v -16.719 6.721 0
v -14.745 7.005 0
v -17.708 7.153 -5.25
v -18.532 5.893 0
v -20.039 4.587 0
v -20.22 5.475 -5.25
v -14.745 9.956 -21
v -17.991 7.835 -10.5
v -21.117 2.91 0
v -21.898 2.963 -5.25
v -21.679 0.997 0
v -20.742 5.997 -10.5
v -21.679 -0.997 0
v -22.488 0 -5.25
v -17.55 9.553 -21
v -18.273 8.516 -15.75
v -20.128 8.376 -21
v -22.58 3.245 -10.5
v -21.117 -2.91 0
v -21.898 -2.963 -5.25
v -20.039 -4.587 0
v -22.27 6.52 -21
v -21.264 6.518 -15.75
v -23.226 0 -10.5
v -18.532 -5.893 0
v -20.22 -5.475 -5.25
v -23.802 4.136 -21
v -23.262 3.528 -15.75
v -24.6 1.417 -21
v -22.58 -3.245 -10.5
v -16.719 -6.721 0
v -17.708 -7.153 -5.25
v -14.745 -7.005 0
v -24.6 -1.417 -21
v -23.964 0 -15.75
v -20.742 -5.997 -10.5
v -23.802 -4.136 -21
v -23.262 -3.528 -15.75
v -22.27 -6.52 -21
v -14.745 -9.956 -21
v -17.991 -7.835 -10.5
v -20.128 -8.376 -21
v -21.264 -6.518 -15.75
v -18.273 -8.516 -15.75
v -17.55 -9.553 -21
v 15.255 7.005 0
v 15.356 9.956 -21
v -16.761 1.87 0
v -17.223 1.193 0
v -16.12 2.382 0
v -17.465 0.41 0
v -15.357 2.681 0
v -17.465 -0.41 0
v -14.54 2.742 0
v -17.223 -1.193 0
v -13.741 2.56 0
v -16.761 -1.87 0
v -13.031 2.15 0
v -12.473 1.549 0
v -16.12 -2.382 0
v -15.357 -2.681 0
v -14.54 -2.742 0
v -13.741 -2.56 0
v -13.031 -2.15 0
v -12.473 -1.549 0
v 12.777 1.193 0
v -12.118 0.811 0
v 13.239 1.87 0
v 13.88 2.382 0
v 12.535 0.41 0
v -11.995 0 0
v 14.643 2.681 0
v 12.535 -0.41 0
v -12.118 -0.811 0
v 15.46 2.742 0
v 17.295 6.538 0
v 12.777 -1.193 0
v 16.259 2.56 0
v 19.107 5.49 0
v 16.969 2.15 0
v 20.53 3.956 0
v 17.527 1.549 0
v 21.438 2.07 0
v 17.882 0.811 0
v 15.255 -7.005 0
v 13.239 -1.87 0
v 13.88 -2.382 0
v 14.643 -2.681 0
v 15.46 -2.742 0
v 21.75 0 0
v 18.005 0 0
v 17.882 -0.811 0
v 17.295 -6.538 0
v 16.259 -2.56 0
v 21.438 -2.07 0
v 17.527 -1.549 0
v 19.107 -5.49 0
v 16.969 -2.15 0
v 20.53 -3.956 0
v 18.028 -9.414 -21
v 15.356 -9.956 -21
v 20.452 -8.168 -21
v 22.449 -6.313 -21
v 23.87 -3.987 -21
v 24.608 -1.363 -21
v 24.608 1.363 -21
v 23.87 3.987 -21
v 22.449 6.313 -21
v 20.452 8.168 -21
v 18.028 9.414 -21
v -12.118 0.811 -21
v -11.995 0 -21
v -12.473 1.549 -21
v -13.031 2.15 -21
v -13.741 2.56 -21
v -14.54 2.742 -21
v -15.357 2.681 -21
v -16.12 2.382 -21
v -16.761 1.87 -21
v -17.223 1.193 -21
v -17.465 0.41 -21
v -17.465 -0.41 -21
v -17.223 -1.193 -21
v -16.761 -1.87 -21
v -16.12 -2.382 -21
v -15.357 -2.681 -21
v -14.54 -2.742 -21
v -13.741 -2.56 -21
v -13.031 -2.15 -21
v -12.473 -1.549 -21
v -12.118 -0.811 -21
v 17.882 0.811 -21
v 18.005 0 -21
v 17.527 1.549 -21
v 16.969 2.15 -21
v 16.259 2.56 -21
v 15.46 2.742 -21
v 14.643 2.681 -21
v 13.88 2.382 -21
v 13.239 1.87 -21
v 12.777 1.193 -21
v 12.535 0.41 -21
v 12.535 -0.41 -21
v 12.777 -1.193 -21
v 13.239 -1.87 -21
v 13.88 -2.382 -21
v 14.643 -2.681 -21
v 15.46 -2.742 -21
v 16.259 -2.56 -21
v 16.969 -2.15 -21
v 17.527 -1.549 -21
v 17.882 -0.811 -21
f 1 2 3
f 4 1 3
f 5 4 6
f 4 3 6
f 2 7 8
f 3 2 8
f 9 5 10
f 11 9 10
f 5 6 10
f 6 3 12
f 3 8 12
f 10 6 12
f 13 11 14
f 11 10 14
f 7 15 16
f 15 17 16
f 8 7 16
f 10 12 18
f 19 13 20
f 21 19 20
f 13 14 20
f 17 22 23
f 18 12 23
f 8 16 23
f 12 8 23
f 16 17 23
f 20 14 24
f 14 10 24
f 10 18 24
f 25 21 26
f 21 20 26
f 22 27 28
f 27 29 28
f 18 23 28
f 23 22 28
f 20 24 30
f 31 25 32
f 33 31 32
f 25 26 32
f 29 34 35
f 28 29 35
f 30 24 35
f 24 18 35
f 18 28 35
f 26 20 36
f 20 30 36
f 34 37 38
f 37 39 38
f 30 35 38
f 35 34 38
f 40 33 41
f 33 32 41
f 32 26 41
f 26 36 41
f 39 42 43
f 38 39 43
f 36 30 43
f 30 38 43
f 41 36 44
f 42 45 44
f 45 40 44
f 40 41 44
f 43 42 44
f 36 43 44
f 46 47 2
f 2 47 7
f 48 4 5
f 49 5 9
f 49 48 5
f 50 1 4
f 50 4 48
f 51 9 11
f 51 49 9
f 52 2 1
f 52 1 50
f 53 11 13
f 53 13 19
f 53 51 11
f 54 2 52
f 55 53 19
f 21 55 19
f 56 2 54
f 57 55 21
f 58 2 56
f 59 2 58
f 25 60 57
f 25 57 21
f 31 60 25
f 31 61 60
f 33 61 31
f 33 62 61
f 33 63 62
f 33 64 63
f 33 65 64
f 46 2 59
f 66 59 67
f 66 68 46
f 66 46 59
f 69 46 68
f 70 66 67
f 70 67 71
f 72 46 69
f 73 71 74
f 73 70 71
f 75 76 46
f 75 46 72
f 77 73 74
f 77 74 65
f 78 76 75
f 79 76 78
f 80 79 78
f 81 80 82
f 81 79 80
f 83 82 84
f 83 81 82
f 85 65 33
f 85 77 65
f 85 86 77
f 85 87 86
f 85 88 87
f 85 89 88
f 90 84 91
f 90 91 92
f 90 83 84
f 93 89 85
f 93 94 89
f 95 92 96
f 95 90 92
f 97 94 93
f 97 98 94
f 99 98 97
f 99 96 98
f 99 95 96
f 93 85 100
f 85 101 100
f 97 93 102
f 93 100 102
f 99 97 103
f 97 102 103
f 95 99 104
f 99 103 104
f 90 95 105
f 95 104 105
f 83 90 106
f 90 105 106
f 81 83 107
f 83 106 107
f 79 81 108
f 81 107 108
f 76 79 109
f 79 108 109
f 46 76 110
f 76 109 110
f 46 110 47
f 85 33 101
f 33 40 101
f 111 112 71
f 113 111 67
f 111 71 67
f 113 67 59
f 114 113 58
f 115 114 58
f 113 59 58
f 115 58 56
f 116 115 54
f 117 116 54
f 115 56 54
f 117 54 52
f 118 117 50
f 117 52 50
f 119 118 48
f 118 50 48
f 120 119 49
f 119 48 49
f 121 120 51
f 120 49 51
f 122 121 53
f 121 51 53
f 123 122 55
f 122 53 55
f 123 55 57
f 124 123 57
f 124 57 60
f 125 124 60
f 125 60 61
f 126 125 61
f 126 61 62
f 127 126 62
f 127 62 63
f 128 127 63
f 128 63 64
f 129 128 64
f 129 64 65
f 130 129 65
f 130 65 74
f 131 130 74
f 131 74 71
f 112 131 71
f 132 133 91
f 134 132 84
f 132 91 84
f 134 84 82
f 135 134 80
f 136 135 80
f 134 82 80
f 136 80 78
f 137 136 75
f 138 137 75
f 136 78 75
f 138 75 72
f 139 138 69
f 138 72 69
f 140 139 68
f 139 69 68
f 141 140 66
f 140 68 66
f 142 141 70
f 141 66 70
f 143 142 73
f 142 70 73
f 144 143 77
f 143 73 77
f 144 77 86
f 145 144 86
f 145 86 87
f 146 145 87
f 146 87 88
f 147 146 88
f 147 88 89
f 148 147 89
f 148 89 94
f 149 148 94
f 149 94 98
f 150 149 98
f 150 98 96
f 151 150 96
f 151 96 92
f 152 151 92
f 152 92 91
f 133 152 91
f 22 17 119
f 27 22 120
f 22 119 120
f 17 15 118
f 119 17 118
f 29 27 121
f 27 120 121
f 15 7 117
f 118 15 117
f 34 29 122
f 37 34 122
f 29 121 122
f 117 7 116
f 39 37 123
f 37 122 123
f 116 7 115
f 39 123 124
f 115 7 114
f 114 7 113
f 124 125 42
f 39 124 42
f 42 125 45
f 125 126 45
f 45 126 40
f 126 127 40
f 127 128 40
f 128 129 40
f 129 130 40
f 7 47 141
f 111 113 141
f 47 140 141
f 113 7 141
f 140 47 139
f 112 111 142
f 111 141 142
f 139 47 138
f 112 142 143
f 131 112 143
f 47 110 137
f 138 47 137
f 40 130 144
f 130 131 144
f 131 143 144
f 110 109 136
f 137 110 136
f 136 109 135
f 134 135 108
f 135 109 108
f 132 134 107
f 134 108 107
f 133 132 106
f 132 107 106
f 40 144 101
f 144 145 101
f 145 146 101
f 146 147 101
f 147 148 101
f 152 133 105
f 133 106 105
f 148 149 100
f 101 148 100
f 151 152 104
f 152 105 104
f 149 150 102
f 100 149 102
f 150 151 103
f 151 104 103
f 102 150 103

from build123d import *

# Parameters (mm, degrees)
F0_R     = 2.75
F1_DEPTH = 21
F1_TAPER = -8
F2_DEPTH = 21.0010001


with BuildPart() as f1:
    # F0 (on Top) → F1 (new body)
    with BuildSketch(Plane.XY):
        with BuildLine():
            ThreePointArc((15.2546531369, -7.0046531369), (21.75, 0), (15.2546531369, 7.0046531369))
            Line((15.2546531369, 7.0046531369), (-14.7453468631, 7.0046531369))
            ThreePointArc((-14.7453468631, 7.0046531369), (-21.75, 0), (-14.7453468631, -7.0046531369))
            Line((-14.7453468631, -7.0046531369), (15.2546531369, -7.0046531369))
        make_face()
        with Locations((-14.7453468631, 0)):
            Circle(F0_R, mode=Mode.SUBTRACT)
        with Locations((15.2546531369, 0)):
            Circle(F0_R, mode=Mode.SUBTRACT)
        with Locations((15.2546531369, 0)):
            Circle(F0_R)
        with Locations((-14.7453468631, 0)):
            Circle(F0_R)
    extrude(amount=-F1_DEPTH, taper=F1_TAPER)

    # F0 (on Top) → F2 (cut, through all)
    with BuildSketch(Plane.XY):
        with Locations((15.2546531369, 0)):
            Circle(F0_R)
        with Locations((-14.7453468631, 0)):
            Circle(F0_R)
    extrude(amount=-F2_DEPTH, mode=Mode.SUBTRACT)


solid = f1.part
